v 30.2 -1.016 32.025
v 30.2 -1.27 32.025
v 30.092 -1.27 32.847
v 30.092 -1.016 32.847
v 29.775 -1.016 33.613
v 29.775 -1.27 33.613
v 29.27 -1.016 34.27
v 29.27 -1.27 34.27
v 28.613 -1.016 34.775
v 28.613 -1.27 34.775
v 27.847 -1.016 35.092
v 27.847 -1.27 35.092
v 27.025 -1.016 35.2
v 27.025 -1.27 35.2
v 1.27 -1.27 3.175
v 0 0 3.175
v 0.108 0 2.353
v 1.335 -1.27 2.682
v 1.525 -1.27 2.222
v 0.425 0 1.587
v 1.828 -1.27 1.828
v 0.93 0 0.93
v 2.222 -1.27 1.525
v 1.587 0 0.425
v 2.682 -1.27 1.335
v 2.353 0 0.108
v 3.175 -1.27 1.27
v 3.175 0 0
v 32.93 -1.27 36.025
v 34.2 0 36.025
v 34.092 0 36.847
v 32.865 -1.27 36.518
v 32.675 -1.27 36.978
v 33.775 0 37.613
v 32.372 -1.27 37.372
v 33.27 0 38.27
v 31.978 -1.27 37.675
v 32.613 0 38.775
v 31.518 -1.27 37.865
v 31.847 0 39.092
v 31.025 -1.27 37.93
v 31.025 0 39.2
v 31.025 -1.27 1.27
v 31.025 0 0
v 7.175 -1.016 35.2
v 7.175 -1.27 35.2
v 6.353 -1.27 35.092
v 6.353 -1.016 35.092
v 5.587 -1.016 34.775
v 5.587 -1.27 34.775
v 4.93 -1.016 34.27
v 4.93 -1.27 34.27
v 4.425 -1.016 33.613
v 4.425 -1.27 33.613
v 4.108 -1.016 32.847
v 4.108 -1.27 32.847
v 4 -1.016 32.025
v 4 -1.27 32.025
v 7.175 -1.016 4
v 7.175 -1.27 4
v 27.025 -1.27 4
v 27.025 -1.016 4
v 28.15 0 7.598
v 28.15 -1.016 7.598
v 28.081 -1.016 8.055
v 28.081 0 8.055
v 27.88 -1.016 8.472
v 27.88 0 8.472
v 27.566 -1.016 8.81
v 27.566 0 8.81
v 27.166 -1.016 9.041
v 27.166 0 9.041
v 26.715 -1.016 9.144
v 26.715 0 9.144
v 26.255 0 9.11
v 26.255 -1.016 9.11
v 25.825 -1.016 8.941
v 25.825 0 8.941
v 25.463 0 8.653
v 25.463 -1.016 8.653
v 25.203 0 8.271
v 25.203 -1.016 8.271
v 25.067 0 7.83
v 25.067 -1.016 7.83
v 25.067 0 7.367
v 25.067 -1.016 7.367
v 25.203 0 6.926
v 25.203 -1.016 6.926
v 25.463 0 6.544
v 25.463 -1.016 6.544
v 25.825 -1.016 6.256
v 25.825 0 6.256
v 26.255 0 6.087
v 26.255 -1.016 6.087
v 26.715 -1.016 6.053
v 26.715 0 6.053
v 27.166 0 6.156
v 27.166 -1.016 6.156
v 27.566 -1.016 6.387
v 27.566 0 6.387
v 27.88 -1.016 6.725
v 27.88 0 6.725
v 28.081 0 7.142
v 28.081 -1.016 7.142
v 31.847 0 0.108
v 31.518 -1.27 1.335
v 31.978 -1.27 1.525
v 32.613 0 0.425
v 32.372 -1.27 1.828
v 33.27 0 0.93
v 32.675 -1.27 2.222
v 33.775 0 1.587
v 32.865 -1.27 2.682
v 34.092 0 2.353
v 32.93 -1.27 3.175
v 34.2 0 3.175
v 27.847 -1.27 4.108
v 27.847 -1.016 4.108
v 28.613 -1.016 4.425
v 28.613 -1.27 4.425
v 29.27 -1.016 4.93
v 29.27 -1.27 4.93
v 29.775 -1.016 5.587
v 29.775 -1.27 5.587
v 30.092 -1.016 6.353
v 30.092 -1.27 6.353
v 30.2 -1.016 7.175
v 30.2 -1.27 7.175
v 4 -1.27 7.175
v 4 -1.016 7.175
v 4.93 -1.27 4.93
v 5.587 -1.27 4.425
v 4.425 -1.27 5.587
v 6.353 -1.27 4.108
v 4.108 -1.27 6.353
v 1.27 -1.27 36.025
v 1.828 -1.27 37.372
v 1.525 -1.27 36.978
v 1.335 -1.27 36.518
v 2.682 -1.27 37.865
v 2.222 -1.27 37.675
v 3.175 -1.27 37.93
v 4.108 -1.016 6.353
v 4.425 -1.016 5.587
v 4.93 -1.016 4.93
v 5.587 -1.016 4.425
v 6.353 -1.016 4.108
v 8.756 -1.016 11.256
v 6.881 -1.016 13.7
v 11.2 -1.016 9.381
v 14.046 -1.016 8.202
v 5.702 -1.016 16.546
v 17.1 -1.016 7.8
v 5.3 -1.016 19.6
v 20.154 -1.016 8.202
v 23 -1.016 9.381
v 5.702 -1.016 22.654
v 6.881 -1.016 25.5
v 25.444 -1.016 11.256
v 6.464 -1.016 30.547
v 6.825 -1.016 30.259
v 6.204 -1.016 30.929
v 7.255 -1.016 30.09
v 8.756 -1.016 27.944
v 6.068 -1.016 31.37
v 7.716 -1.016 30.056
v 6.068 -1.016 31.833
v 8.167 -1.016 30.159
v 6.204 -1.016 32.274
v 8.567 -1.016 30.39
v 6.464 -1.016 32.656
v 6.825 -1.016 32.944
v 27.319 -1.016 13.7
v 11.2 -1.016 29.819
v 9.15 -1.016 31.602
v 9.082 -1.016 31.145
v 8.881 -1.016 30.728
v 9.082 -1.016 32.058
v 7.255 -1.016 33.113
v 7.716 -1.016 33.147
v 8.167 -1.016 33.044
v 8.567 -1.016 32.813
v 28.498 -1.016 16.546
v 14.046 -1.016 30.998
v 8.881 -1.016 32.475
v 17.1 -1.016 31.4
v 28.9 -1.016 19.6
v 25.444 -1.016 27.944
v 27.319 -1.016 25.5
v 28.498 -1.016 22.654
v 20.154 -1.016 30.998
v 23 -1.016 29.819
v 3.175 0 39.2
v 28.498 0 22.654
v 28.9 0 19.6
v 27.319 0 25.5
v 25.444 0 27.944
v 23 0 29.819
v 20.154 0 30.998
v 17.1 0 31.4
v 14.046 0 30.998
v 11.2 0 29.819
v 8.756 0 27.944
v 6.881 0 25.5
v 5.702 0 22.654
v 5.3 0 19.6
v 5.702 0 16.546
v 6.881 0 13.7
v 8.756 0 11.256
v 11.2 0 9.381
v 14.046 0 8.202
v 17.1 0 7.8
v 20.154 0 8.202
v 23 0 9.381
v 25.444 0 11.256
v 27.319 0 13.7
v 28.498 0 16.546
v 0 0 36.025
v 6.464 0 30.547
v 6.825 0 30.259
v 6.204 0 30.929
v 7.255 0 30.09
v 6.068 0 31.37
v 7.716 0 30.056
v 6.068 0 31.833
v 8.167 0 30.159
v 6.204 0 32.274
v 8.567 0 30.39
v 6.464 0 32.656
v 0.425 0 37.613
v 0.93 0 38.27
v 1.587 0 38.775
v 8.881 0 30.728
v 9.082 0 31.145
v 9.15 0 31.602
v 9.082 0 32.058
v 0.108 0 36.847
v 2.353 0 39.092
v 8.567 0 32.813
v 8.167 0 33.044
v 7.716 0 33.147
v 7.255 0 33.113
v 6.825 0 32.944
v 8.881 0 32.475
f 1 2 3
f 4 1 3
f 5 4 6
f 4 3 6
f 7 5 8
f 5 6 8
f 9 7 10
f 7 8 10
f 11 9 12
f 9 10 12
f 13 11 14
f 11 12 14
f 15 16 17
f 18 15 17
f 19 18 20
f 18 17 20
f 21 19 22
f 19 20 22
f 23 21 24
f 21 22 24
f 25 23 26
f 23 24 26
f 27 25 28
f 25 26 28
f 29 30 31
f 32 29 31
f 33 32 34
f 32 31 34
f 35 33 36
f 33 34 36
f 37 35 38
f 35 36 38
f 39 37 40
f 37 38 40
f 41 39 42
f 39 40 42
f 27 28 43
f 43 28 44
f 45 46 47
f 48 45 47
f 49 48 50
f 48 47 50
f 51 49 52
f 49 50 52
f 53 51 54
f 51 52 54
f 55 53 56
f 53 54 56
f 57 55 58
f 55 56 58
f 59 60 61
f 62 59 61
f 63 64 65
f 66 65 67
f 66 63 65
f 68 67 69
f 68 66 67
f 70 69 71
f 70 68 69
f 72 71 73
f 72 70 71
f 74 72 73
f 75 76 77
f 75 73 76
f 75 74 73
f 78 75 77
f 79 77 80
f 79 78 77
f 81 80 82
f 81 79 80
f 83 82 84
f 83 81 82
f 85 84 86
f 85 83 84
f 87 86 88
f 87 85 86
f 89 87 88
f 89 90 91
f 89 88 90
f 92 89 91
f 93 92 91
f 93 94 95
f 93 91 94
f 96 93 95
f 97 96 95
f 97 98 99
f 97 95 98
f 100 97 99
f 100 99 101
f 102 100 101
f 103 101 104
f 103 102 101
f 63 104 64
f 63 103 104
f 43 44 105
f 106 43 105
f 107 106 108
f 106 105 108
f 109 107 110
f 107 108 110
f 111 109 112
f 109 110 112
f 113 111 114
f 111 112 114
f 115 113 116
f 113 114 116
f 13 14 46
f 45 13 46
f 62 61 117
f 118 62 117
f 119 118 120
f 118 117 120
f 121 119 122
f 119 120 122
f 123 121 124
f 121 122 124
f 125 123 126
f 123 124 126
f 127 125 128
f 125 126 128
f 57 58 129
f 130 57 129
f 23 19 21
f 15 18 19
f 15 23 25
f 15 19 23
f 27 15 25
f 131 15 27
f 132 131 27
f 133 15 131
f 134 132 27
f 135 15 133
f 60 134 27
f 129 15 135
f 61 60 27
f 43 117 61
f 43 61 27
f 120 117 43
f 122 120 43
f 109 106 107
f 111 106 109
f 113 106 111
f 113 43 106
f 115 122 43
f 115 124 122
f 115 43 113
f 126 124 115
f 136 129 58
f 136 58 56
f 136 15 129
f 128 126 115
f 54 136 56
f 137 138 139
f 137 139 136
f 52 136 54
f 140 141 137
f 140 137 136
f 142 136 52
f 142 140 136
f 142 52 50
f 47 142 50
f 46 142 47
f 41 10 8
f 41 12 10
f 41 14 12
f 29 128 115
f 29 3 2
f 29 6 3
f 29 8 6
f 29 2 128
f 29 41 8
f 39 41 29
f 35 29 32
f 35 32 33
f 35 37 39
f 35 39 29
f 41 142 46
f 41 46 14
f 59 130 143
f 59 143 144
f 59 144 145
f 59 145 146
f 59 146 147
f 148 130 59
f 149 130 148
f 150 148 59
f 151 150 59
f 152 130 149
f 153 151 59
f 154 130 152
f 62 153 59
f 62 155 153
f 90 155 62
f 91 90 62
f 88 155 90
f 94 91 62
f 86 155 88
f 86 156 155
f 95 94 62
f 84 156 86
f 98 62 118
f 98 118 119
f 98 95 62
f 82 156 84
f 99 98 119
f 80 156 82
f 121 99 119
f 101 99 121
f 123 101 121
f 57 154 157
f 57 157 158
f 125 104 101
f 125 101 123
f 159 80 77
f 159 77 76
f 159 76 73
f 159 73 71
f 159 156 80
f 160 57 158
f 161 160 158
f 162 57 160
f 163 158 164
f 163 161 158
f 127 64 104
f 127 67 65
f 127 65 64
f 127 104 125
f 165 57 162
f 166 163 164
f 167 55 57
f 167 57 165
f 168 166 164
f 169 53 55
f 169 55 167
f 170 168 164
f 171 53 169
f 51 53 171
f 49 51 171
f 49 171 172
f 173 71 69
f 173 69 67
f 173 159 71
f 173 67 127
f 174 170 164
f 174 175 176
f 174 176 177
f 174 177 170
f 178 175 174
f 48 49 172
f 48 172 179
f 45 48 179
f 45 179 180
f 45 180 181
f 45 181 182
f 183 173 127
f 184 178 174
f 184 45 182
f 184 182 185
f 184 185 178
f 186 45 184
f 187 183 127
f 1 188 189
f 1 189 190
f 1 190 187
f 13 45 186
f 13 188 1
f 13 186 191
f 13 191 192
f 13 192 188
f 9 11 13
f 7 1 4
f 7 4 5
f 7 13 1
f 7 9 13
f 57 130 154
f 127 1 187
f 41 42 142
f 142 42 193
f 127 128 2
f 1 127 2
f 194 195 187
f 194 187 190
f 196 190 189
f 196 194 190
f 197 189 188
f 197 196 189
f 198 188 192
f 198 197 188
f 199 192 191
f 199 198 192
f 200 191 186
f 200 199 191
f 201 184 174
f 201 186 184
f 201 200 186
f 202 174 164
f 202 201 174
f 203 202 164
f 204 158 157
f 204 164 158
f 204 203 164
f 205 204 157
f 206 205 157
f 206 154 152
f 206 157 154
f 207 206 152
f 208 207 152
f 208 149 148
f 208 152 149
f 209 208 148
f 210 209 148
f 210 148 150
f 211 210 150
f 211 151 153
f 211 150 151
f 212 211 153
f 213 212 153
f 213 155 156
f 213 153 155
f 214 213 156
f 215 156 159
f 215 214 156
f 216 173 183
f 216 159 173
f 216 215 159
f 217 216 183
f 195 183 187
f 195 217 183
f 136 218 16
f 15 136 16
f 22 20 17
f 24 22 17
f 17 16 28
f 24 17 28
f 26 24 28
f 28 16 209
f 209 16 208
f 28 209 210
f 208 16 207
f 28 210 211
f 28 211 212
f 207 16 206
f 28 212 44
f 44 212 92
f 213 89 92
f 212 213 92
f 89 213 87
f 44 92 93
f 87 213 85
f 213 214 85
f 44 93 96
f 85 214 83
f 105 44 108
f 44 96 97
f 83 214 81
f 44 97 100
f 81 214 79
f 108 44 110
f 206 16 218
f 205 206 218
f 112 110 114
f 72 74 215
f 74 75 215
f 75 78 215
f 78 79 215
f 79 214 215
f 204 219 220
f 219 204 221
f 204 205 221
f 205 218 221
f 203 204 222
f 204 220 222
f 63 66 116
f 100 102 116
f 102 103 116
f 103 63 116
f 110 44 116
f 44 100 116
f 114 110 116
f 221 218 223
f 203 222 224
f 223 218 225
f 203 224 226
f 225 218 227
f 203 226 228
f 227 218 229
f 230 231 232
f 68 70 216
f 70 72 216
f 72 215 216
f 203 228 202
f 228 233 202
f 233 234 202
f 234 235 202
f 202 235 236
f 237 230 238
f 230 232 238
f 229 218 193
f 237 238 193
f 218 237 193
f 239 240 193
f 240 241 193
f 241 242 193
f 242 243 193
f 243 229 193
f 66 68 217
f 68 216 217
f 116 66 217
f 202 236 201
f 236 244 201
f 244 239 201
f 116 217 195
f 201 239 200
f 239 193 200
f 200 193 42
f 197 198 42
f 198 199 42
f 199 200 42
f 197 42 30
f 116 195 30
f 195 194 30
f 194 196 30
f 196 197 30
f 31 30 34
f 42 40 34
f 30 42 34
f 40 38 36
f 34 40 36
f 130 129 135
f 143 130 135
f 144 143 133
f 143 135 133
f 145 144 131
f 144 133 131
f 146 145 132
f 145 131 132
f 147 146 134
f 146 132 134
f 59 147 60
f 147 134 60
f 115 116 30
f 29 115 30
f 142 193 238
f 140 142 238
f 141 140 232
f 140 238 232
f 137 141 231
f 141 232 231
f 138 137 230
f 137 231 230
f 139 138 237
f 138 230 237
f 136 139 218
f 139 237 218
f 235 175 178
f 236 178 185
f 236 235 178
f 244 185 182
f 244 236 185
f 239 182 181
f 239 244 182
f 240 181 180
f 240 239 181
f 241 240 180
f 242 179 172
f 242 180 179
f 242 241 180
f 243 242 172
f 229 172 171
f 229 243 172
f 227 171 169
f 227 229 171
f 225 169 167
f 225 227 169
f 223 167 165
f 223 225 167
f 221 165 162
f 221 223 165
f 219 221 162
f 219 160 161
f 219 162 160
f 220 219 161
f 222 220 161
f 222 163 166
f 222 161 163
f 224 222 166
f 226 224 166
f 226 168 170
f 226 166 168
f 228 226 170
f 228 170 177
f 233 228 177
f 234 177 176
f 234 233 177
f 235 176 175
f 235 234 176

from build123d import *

# Parameters (mm, degrees)
F0_R     = 1.55
F0_R_2   = 11.8
F1_DEPTH = 1.27
F3_DEPTH = 0.254
F4_SIZE  = 1.26999


# Not quite as in the source:
# - a fillet or chamfer is up to 0.001 mm smaller than in the source, because OpenCascade refuses the exact size


with BuildPart() as f1:
    # F0 (on Front) → F1 (new body)
    with BuildSketch(Plane.XZ):
        with BuildLine():
            ThreePointArc((0, 3.175), (0.9299359697, 0.9299359697), (3.175, 0))
            Line((3.175, 0), (31.025, 0))
            ThreePointArc((31.025, 0), (33.2700640303, 0.9299359697), (34.2, 3.175))
            Line((34.2, 3.175), (34.2, 36.025))
            ThreePointArc((34.2, 36.025), (33.2700640303, 38.2700640303), (31.025, 39.2))
            Line((31.025, 39.2), (3.175, 39.2))
            ThreePointArc((3.175, 39.2), (0.9299359697, 38.2700640303), (0, 36.025))
            Line((0, 36.025), (0, 3.175))
        make_face()
        with Locations((26.5996, 7.5985)):
            Circle(F0_R, mode=Mode.SUBTRACT)
        with Locations((7.6004, 31.6015)):
            Circle(F0_R, mode=Mode.SUBTRACT)
        with Locations((17.1, 19.6)):
            Circle(F0_R_2, mode=Mode.SUBTRACT)
    extrude(amount=F1_DEPTH)

    # F2 (on face) → F3 (cut)
    with BuildSketch(Plane.XZ.offset(1.27)):
        with BuildLine():
            Line((27.025, 35.2), (7.175, 35.2))
            ThreePointArc((7.175, 35.2), (4.9299359697, 34.2700640303), (4, 32.025))
            Line((4, 32.025), (4, 7.175))
            ThreePointArc((4, 7.175), (4.9299359697, 4.9299359697), (7.175, 4))
            Line((7.175, 4), (27.025, 4))
            ThreePointArc((27.025, 4), (29.2700640303, 4.9299359697), (30.2, 7.175))
            Line((30.2, 7.175), (30.2, 32.025))
            ThreePointArc((30.2, 32.025), (29.2700640303, 34.2700640303), (27.025, 35.2))
        make_face()
    extrude(amount=-F3_DEPTH, mode=Mode.SUBTRACT)

    # F4 (size 1.27 in the source; OpenCascade refuses exactly that, so slightly less here)
    f4_edges = [f1.edges().sort_by_distance(p)[0] for p in [
        (34.2, -1.27, 19.6),
    ]]
    chamfer(f4_edges, length=F4_SIZE)


solid = f1.part
